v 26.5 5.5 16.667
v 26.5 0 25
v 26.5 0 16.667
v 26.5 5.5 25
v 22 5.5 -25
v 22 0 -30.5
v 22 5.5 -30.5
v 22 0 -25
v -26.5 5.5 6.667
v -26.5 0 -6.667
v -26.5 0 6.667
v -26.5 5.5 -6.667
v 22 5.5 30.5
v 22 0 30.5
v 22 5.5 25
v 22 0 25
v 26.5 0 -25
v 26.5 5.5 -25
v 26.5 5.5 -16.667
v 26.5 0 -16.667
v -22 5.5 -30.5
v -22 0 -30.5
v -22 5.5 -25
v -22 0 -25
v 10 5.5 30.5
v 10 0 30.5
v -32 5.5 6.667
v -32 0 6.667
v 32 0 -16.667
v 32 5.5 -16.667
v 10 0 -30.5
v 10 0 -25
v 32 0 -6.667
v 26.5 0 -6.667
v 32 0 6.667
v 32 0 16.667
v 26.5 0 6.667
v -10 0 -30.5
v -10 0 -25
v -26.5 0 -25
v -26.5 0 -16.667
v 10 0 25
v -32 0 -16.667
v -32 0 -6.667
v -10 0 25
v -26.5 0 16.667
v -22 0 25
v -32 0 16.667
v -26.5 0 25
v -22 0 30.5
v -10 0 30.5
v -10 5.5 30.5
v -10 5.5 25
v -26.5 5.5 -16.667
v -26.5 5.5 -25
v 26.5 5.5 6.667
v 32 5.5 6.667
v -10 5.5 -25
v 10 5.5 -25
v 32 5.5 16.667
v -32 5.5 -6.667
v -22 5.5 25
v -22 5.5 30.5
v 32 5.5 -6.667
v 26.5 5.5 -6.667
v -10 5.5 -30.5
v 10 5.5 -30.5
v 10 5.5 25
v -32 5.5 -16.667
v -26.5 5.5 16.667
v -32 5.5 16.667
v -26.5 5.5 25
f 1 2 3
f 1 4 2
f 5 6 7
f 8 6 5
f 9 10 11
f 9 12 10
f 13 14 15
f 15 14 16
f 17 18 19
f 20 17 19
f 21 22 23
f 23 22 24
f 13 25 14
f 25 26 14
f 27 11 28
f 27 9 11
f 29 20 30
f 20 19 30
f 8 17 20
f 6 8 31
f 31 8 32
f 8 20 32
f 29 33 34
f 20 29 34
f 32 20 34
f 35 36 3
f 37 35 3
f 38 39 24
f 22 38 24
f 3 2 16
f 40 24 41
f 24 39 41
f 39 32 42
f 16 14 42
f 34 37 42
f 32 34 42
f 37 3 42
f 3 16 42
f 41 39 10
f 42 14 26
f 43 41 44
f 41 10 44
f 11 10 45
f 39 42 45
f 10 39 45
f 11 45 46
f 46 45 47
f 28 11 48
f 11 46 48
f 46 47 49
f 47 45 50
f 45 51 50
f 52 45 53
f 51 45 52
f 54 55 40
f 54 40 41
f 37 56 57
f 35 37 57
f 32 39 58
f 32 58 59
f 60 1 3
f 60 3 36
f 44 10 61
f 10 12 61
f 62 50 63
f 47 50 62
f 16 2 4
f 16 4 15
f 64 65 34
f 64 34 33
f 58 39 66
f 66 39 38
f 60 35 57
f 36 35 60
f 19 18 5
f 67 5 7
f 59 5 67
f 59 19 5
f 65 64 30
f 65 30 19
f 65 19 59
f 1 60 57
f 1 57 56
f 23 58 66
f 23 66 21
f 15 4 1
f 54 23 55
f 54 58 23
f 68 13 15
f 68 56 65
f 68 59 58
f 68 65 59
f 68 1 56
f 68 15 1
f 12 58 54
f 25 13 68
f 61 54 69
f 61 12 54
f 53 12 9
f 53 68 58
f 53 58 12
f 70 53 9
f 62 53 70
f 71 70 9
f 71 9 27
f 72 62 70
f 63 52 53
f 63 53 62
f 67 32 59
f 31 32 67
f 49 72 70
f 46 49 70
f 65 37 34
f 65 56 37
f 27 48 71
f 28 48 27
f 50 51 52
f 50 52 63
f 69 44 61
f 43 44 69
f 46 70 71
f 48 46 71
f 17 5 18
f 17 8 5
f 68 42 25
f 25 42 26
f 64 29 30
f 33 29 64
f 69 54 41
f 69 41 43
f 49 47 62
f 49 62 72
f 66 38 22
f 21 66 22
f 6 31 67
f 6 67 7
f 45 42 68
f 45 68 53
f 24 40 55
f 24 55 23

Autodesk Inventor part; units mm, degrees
ref_plane "YZ Plane" through (0, 0, 0) normal (1, 0, 0) x (0, 1, 0)
ref_plane "XZ Plane" through (0, 0, 0) normal (0, 1, 0) x (-1, 0, 0)
ref_plane "XY Plane" through (0, 0, 0) normal (0, 0, 1) x (1, 0, 0)
sketch "Block1" plane through (0, 0, 0) normal (0, 0, 1) x (1, 0, 0)
  line L0 (-35.5, -12.8333) -> (-26.5, -12.8333)
  line L1 (-30, 3.8333) -> (-35.5, 3.8333)
  line L2 (-35.5, 3.8333) -> (-26.5, 3.8333)
  line L3 (-26.5, 3.8333) -> (-26.5, -12.8333)
  line L4 (-26.5, -12.8333) -> (-35.5, -12.8333)
  line L5 (-35.5, -12.8333) -> (-35.5, 3.8333)
  line L6 (26.5, 3.8333) -> (35.5, 3.8333)
  line L7 (35.5, 3.8333) -> (26.5, 3.8333)
  line L8 (26.5, 3.8333) -> (26.5, -12.8333)
  line L9 (35.5, -12.8333) -> (35.5, 3.8333)
  line L10 (26.5, -12.8333) -> (35.5, -12.8333)
  line L11 (35.5, -12.8333) -> (26.5, -12.8333)
  point P0 (0, -4.5)
  dimension "d37" = 5.5
sketch "Block2" plane through (0, 0, 0) normal (0, 0, 1) x (1, 0, 0)
  line L0 (-30, -5) -> (-35.5, -5)
  line L1 (-26.5, 5) -> (-35.5, 5)
  line L2 (-35.5, -5) -> (-26.5, -5)
  line L3 (-26.5, -5) -> (-26.5, 5)
  line L4 (-26.5, 5) -> (-35.5, 5)
  line L5 (-35.5, 5) -> (-35.5, -5)
  line L6 (26.5, -5) -> (26.5, 5)
  line L7 (35.5, -5) -> (26.5, -5)
  line L8 (26.5, 5) -> (35.5, 5)
  line L9 (35.5, 5) -> (35.5, -5)
  line L10 (26.5, 5) -> (35.5, 5)
  line L11 (26.5, -5) -> (35.5, -5)
  point P0 (0, 0)
  dimension "d51" = 5.5
sketch "Block3" plane through (0, 0, 0) normal (0, 0, 1) x (1, 0, 0)
  line L0 (-9.9, 25.1) -> (9.9, 25.1)
  line L1 (9.9, 25.1) -> (9.9, 34.1)
  line L2 (9.9, 34.1) -> (22.1, 34.1)
  line L3 (22.1, 34.1) -> (22.1, 25.1)
  line L4 (22.1, 25.1) -> (26.6, 25.1)
  line L5 (26.6, 25.1) -> (26.6, 16.7667)
  line L6 (26.6, 16.7667) -> (35.6, 16.7667)
  line L7 (35.6, 16.7667) -> (35.6, 6.5667)
  line L8 (35.6, 6.5667) -> (26.6, 6.5667)
  line L9 (26.6, 6.5667) -> (26.6, -6.5667)
  line L10 (26.6, -6.5667) -> (35.6, -6.5667)
  line L11 (35.6, -6.5667) -> (35.6, -16.7667)
  line L12 (35.6, -16.7667) -> (26.6, -16.7667)
  line L13 (26.6, -16.7667) -> (26.6, -25.1)
  line L14 (26.6, -25.1) -> (22.1, -25.1)
  line L15 (22.1, -25.1) -> (22.1, -34.1)
  line L16 (22.1, -34.1) -> (9.9, -34.1)
  line L17 (9.9, -34.1) -> (9.9, -25.1)
  line L18 (9.9, -25.1) -> (-9.9, -25.1)
  line L19 (-9.9, -25.1) -> (-9.9, -34.1)
  line L20 (-9.9, -34.1) -> (-22.1, -34.1)
  line L21 (-22.1, -34.1) -> (-22.1, -25.1)
  line L22 (-22.1, -25.1) -> (-26.6, -25.1)
  line L23 (-26.6, -25.1) -> (-26.6, -16.7667)
  line L24 (-26.6, -16.7667) -> (-35.6, -16.7667)
  line L25 (-35.6, -16.7667) -> (-35.6, -6.5667)
  line L26 (-35.6, -6.5667) -> (-26.6, -6.5667)
  line L27 (-26.6, -6.5667) -> (-26.6, 6.5667)
  line L28 (-26.6, 6.5667) -> (-35.6, 6.5667)
  line L29 (-35.6, 6.5667) -> (-35.6, 16.7667)
  line L30 (-35.6, 16.7667) -> (-26.6, 16.7667)
  line L31 (-26.6, 16.7667) -> (-26.6, 25.1)
  line L32 (-26.6, 25.1) -> (-22.1, 25.1)
  line L33 (-22.1, 25.1) -> (-22.1, 34.1)
  line L34 (-22.1, 34.1) -> (-9.9, 34.1)
  line L35 (-9.9, 34.1) -> (-9.9, 25.1)
  line L36 (-26.5, -6.6667) -> (-35.5, -6.6667)
  line L37 (-35.5, -6.6667) -> (-35.5, -16.6667)
  line L38 (-35.5, -16.6667) -> (-26.5, -16.6667)
  line L39 (-26.5, -16.6667) -> (-26.5, -25)
  line L40 (-26.5, -25) -> (-22, -25)
  line L41 (-22, -25) -> (-22, -34)
  line L42 (-22, -34) -> (-10, -34)
  line L43 (-10, -34) -> (-10, -25)
  line L44 (-10, -25) -> (10, -25)
  line L45 (10, -34) -> (10, -25)
  line L46 (22, -34) -> (10, -34)
  line L47 (22, -25) -> (22, -34)
  line L48 (22, -25) -> (26.5, -25)
  line L49 (26.5, -25) -> (26.5, -16.6667)
  line L50 (26.5, -16.6667) -> (35.5, -16.6667)
  line L51 (35.5, -16.6667) -> (35.5, -6.6667)
  line L52 (35.5, -6.6667) -> (26.5, -6.6667)
  line L53 (26.5, -6.6667) -> (26.5, 6.6667)
  line L54 (26.5, 6.6667) -> (35.5, 6.6667)
  line L55 (35.5, 6.6667) -> (35.5, 16.6667)
  line L56 (35.5, 16.6667) -> (26.5, 16.6667)
  line L57 (26.5, 16.6667) -> (26.5, 25)
  line L58 (26.5, 25) -> (22, 25)
  line L59 (22, 25) -> (22, 34)
  line L60 (22, 34) -> (10, 34)
  line L61 (10, 34) -> (10, 25)
  line L62 (10, 25) -> (-10, 25)
  line L63 (-10, 25) -> (-10, 34)
  line L64 (-10, 34) -> (-22, 34)
  line L65 (-22, 34) -> (-22, 25)
  line L66 (-22, 25) -> (-26.5, 25)
  line L67 (-26.5, 25) -> (-26.5, 16.6667)
  line L68 (-26.5, 16.6667) -> (-35.5, 16.6667)
  line L69 (-35.5, 16.6667) -> (-35.5, 6.6667)
  line L70 (-35.5, 6.6667) -> (-26.5, 6.6667)
  line L71 (-26.5, 6.6667) -> (-26.5, -6.6667)
  line L72 (-9.9, 25.1) -> (9.9, 25.1)
  line L73 (9.9, 25.1) -> (9.9, 34.1)
  line L74 (9.9, 34.1) -> (22.1, 34.1)
  line L75 (22.1, 34.1) -> (22.1, 25.1)
  line L76 (22.1, 25.1) -> (26.6, 25.1)
  line L77 (26.6, 25.1) -> (26.6, 16.7667)
  line L78 (26.6, 16.7667) -> (35.6, 16.7667)
  line L79 (35.6, 16.7667) -> (35.6, 6.5667)
  line L80 (35.6, 6.5667) -> (26.6, 6.5667)
  line L81 (26.6, 6.5667) -> (26.6, -6.5667)
  line L82 (26.6, -6.5667) -> (35.6, -6.5667)
  line L83 (35.6, -6.5667) -> (35.6, -16.7667)
  line L84 (35.6, -16.7667) -> (26.6, -16.7667)
  line L85 (26.6, -16.7667) -> (26.6, -25.1)
  line L86 (26.6, -25.1) -> (22.1, -25.1)
  line L87 (22.1, -25.1) -> (22.1, -34.1)
  line L88 (22.1, -34.1) -> (9.9, -34.1)
  line L89 (9.9, -34.1) -> (9.9, -25.1)
  line L90 (9.9, -25.1) -> (-9.9, -25.1)
  line L91 (-9.9, -25.1) -> (-9.9, -34.1)
  line L92 (-9.9, -34.1) -> (-22.1, -34.1)
  line L93 (-22.1, -34.1) -> (-22.1, -25.1)
  line L94 (-22.1, -25.1) -> (-26.6, -25.1)
  line L95 (-26.6, -25.1) -> (-26.6, -16.7667)
  line L96 (-26.6, -16.7667) -> (-35.6, -16.7667)
  line L97 (-35.6, -16.7667) -> (-35.6, -6.5667)
  line L98 (-35.6, -6.5667) -> (-26.6, -6.5667)
  line L99 (-26.6, -6.5667) -> (-26.6, 6.5667)
  line L100 (-26.6, 6.5667) -> (-35.6, 6.5667)
  line L101 (-35.6, 6.5667) -> (-35.6, 16.7667)
  line L102 (-35.6, 16.7667) -> (-26.6, 16.7667)
  line L103 (-26.6, 16.7667) -> (-26.6, 25.1)
  line L104 (-26.6, 25.1) -> (-22.1, 25.1)
  line L105 (-22.1, 25.1) -> (-22.1, 34.1)
  line L106 (-22.1, 34.1) -> (-9.9, 34.1)
  line L107 (-9.9, 34.1) -> (-9.9, 25.1)
  line L108 (-26.5, -6.6667) -> (-35.5, -6.6667)
  line L109 (-35.5, -6.6667) -> (-35.5, -16.6667)
  line L110 (-35.5, -16.6667) -> (-26.5, -16.6667)
  line L111 (-26.5, -16.6667) -> (-26.5, -25)
  line L112 (-26.5, -25) -> (-22, -25)
  line L113 (-22, -25) -> (-22, -34)
  line L114 (-22, -34) -> (-10, -34)
  line L115 (-10, -34) -> (-10, -25)
  line L116 (-10, -25) -> (10, -25)
  line L117 (10, -34) -> (10, -25)
  line L118 (22, -34) -> (10, -34)
  line L119 (22, -25) -> (22, -34)
  line L120 (22, -25) -> (26.5, -25)
  line L121 (26.5, -25) -> (26.5, -16.6667)
  line L122 (26.5, -16.6667) -> (35.5, -16.6667)
  line L123 (35.5, -16.6667) -> (35.5, -6.6667)
  line L124 (35.5, -6.6667) -> (26.5, -6.6667)
  line L125 (26.5, -6.6667) -> (26.5, 6.6667)
  line L126 (26.5, 6.6667) -> (35.5, 6.6667)
  line L127 (35.5, 6.6667) -> (35.5, 16.6667)
  line L128 (35.5, 16.6667) -> (26.5, 16.6667)
  line L129 (26.5, 16.6667) -> (26.5, 25)
  line L130 (26.5, 25) -> (22, 25)
  line L131 (22, 25) -> (22, 34)
  line L132 (22, 34) -> (10, 34)
  line L133 (10, 34) -> (10, 25)
  line L134 (10, 25) -> (-10, 25)
  line L135 (-10, 25) -> (-10, 34)
  line L136 (-10, 34) -> (-22, 34)
  line L137 (-22, 34) -> (-22, 25)
  line L138 (-22, 25) -> (-26.5, 25)
  line L139 (-26.5, 25) -> (-26.5, 16.6667)
  line L140 (-26.5, 16.6667) -> (-35.5, 16.6667)
  line L141 (-35.5, 16.6667) -> (-35.5, 6.6667)
  line L142 (-35.5, 6.6667) -> (-26.5, 6.6667)
  line L143 (-26.5, 6.6667) -> (-26.5, -6.6667)
  line L144 (-9.9, 25.1) -> (9.9, 25.1)
  line L145 (9.9, 25.1) -> (9.9, 34.1)
  line L146 (9.9, 34.1) -> (22.1, 34.1)
  line L147 (22.1, 34.1) -> (22.1, 25.1)
  line L148 (22.1, 25.1) -> (26.6, 25.1)
  line L149 (26.6, 25.1) -> (26.6, 16.7667)
  line L150 (26.6, 16.7667) -> (35.6, 16.7667)
  line L151 (35.6, 16.7667) -> (35.6, 6.5667)
  line L152 (35.6, 6.5667) -> (26.6, 6.5667)
  line L153 (26.6, 6.5667) -> (26.6, -6.5667)
  line L154 (26.6, -6.5667) -> (35.6, -6.5667)
  line L155 (35.6, -6.5667) -> (35.6, -16.7667)
  line L156 (35.6, -16.7667) -> (26.6, -16.7667)
  line L157 (26.6, -16.7667) -> (26.6, -25.1)
  line L158 (26.6, -25.1) -> (22.1, -25.1)
  line L159 (22.1, -25.1) -> (22.1, -34.1)
  line L160 (22.1, -34.1) -> (9.9, -34.1)
  line L161 (9.9, -34.1) -> (9.9, -25.1)
  line L162 (9.9, -25.1) -> (-9.9, -25.1)
  line L163 (-9.9, -25.1) -> (-9.9, -34.1)
  line L164 (-9.9, -34.1) -> (-22.1, -34.1)
  line L165 (-22.1, -34.1) -> (-22.1, -25.1)
  line L166 (-22.1, -25.1) -> (-26.6, -25.1)
  line L167 (-26.6, -25.1) -> (-26.6, -16.7667)
  line L168 (-26.6, -16.7667) -> (-35.6, -16.7667)
  line L169 (-35.6, -16.7667) -> (-35.6, -6.5667)
  line L170 (-35.6, -6.5667) -> (-26.6, -6.5667)
  line L171 (-26.6, -6.5667) -> (-26.6, 6.5667)
  line L172 (-26.6, 6.5667) -> (-35.6, 6.5667)
  line L173 (-35.6, 6.5667) -> (-35.6, 16.7667)
  line L174 (-35.6, 16.7667) -> (-26.6, 16.7667)
  line L175 (-26.6, 16.7667) -> (-26.6, 25.1)
  line L176 (-26.6, 25.1) -> (-22.1, 25.1)
  line L177 (-22.1, 25.1) -> (-22.1, 34.1)
  line L178 (-22.1, 34.1) -> (-9.9, 34.1)
  line L179 (-9.9, 34.1) -> (-9.9, 25.1)
  line L180 (-26.5, -6.6667) -> (-35.5, -6.6667)
  line L181 (-35.5, -6.6667) -> (-35.5, -16.6667)
  line L182 (-35.5, -16.6667) -> (-26.5, -16.6667)
  line L183 (-26.5, -16.6667) -> (-26.5, -25)
  line L184 (-26.5, -25) -> (-22, -25)
  line L185 (-22, -25) -> (-22, -34)
  line L186 (-22, -34) -> (-10, -34)
  line L187 (-10, -34) -> (-10, -25)
  line L188 (-10, -25) -> (10, -25)
  line L189 (10, -34) -> (10, -25)
  line L190 (22, -34) -> (10, -34)
  line L191 (22, -25) -> (22, -34)
  line L192 (22, -25) -> (26.5, -25)
  line L193 (26.5, -25) -> (26.5, -16.6667)
  line L194 (26.5, -16.6667) -> (35.5, -16.6667)
  line L195 (35.5, -16.6667) -> (35.5, -6.6667)
  line L196 (35.5, -6.6667) -> (26.5, -6.6667)
  line L197 (26.5, -6.6667) -> (26.5, 6.6667)
  line L198 (26.5, 6.6667) -> (35.5, 6.6667)
  line L199 (35.5, 6.6667) -> (35.5, 16.6667)
  line L200 (35.5, 16.6667) -> (26.5, 16.6667)
  line L201 (26.5, 16.6667) -> (26.5, 25)
  line L202 (26.5, 25) -> (22, 25)
  line L203 (22, 25) -> (22, 34)
  line L204 (22, 34) -> (10, 34)
  line L205 (10, 34) -> (10, 25)
  line L206 (10, 25) -> (-10, 25)
  line L207 (-10, 25) -> (-10, 34)
  line L208 (-10, 34) -> (-22, 34)
  line L209 (-22, 34) -> (-22, 25)
  line L210 (-22, 25) -> (-26.5, 25)
  line L211 (-26.5, 25) -> (-26.5, 16.6667)
  line L212 (-26.5, 16.6667) -> (-35.5, 16.6667)
  line L213 (-35.5, 16.6667) -> (-35.5, 6.6667)
  line L214 (-35.5, 6.6667) -> (-26.5, 6.6667)
  line L215 (-26.5, 6.6667) -> (-26.5, -6.6667)
  line L216 (-9.9, 25.1) -> (9.9, 25.1)
  line L217 (9.9, 25.1) -> (9.9, 34.1)
  line L218 (9.9, 34.1) -> (22.1, 34.1)
  line L219 (22.1, 34.1) -> (22.1, 25.1)
  line L220 (22.1, 25.1) -> (26.6, 25.1)
  line L221 (26.6, 25.1) -> (26.6, 16.7667)
  line L222 (26.6, 16.7667) -> (35.6, 16.7667)
  line L223 (35.6, 16.7667) -> (35.6, 6.5667)
  line L224 (35.6, 6.5667) -> (26.6, 6.5667)
  line L225 (26.6, 6.5667) -> (26.6, -6.5667)
  line L226 (26.6, -6.5667) -> (35.6, -6.5667)
  line L227 (35.6, -6.5667) -> (35.6, -16.7667)
  line L228 (35.6, -16.7667) -> (26.6, -16.7667)
  line L229 (26.6, -16.7667) -> (26.6, -25.1)
  line L230 (26.6, -25.1) -> (22.1, -25.1)
  line L231 (22.1, -25.1) -> (22.1, -34.1)
  line L232 (22.1, -34.1) -> (9.9, -34.1)
  line L233 (9.9, -34.1) -> (9.9, -25.1)
  line L234 (9.9, -25.1) -> (-9.9, -25.1)
  line L235 (-9.9, -25.1) -> (-9.9, -34.1)
  line L236 (-9.9, -34.1) -> (-22.1, -34.1)
  line L237 (-22.1, -34.1) -> (-22.1, -25.1)
  line L238 (-22.1, -25.1) -> (-26.6, -25.1)
  line L239 (-26.6, -25.1) -> (-26.6, -16.7667)
  line L240 (-26.6, -16.7667) -> (-35.6, -16.7667)
  line L241 (-35.6, -16.7667) -> (-35.6, -6.5667)
  line L242 (-35.6, -6.5667) -> (-26.6, -6.5667)
  line L243 (-26.6, -6.5667) -> (-26.6, 6.5667)
  line L244 (-26.6, 6.5667) -> (-35.6, 6.5667)
  line L245 (-35.6, 6.5667) -> (-35.6, 16.7667)
  line L246 (-35.6, 16.7667) -> (-26.6, 16.7667)
  line L247 (-26.6, 16.7667) -> (-26.6, 25.1)
  line L248 (-26.6, 25.1) -> (-22.1, 25.1)
  line L249 (-22.1, 25.1) -> (-22.1, 34.1)
  line L250 (-22.1, 34.1) -> (-9.9, 34.1)
  line L251 (-9.9, 34.1) -> (-9.9, 25.1)
  line L252 (-26.5, -6.6667) -> (-35.5, -6.6667)
  line L253 (-35.5, -6.6667) -> (-35.5, -16.6667)
  line L254 (-35.5, -16.6667) -> (-26.5, -16.6667)
  line L255 (-26.5, -16.6667) -> (-26.5, -25)
  line L256 (-26.5, -25) -> (-22, -25)
  line L257 (-22, -25) -> (-22, -34)
  line L258 (-22, -34) -> (-10, -34)
  line L259 (-10, -34) -> (-10, -25)
  line L260 (-10, -25) -> (10, -25)
  line L261 (10, -34) -> (10, -25)
  line L262 (22, -34) -> (10, -34)
  line L263 (22, -25) -> (22, -34)
  line L264 (22, -25) -> (26.5, -25)
  line L265 (26.5, -25) -> (26.5, -16.6667)
  line L266 (26.5, -16.6667) -> (35.5, -16.6667)
  line L267 (35.5, -16.6667) -> (35.5, -6.6667)
  line L268 (35.5, -6.6667) -> (26.5, -6.6667)
  line L269 (26.5, -6.6667) -> (26.5, 6.6667)
  line L270 (26.5, 6.6667) -> (35.5, 6.6667)
  line L271 (35.5, 6.6667) -> (35.5, 16.6667)
  line L272 (35.5, 16.6667) -> (26.5, 16.6667)
  line L273 (26.5, 16.6667) -> (26.5, 25)
  line L274 (26.5, 25) -> (22, 25)
  line L275 (22, 25) -> (22, 34)
  line L276 (22, 34) -> (10, 34)
  line L277 (10, 34) -> (10, 25)
  line L278 (10, 25) -> (-10, 25)
  line L279 (-10, 25) -> (-10, 34)
  line L280 (-10, 34) -> (-22, 34)
  line L281 (-22, 34) -> (-22, 25)
  line L282 (-22, 25) -> (-26.5, 25)
  line L283 (-26.5, 25) -> (-26.5, 16.6667)
  line L284 (-26.5, 16.6667) -> (-35.5, 16.6667)
  line L285 (-35.5, 16.6667) -> (-35.5, 6.6667)
  line L286 (-35.5, 6.6667) -> (-26.5, 6.6667)
  line L287 (-26.5, 6.6667) -> (-26.5, -6.6667)
  line L288 (-9.9, 25.1) -> (9.9, 25.1)
  line L289 (9.9, 25.1) -> (9.9, 34.1)
  line L290 (9.9, 34.1) -> (22.1, 34.1)
  line L291 (22.1, 34.1) -> (22.1, 25.1)
  line L292 (22.1, 25.1) -> (26.6, 25.1)
  line L293 (26.6, 25.1) -> (26.6, 16.7667)
  line L294 (26.6, 16.7667) -> (35.6, 16.7667)
  line L295 (35.6, 16.7667) -> (35.6, 6.5667)
  line L296 (35.6, 6.5667) -> (26.6, 6.5667)
  line L297 (26.6, 6.5667) -> (26.6, -6.5667)
  line L298 (26.6, -6.5667) -> (35.6, -6.5667)
  line L299 (35.6, -6.5667) -> (35.6, -16.7667)
  line L300 (35.6, -16.7667) -> (26.6, -16.7667)
  line L301 (26.6, -16.7667) -> (26.6, -25.1)
  line L302 (26.6, -25.1) -> (22.1, -25.1)
  line L303 (22.1, -25.1) -> (22.1, -34.1)
  line L304 (22.1, -34.1) -> (9.9, -34.1)
  line L305 (9.9, -34.1) -> (9.9, -25.1)
  line L306 (9.9, -25.1) -> (-9.9, -25.1)
  line L307 (-9.9, -25.1) -> (-9.9, -34.1)
  line L308 (-9.9, -34.1) -> (-22.1, -34.1)
  line L309 (-22.1, -34.1) -> (-22.1, -25.1)
  line L310 (-22.1, -25.1) -> (-26.6, -25.1)
  line L311 (-26.6, -25.1) -> (-26.6, -16.7667)
  line L312 (-26.6, -16.7667) -> (-35.6, -16.7667)
  line L313 (-35.6, -16.7667) -> (-35.6, -6.5667)
  line L314 (-35.6, -6.5667) -> (-26.6, -6.5667)
  line L315 (-26.6, -6.5667) -> (-26.6, 6.5667)
  line L316 (-26.6, 6.5667) -> (-35.6, 6.5667)
  line L317 (-35.6, 6.5667) -> (-35.6, 16.7667)
  line L318 (-35.6, 16.7667) -> (-26.6, 16.7667)
  line L319 (-26.6, 16.7667) -> (-26.6, 25.1)
  line L320 (-26.6, 25.1) -> (-22.1, 25.1)
  line L321 (-22.1, 25.1) -> (-22.1, 34.1)
  line L322 (-22.1, 34.1) -> (-9.9, 34.1)
  line L323 (-9.9, 34.1) -> (-9.9, 25.1)
  line L324 (-26.5, -6.6667) -> (-35.5, -6.6667)
  line L325 (-35.5, -6.6667) -> (-35.5, -16.6667)
  line L326 (-35.5, -16.6667) -> (-26.5, -16.6667)
  line L327 (-26.5, -16.6667) -> (-26.5, -25)
  line L328 (-26.5, -25) -> (-22, -25)
  line L329 (-22, -25) -> (-22, -34)
  line L330 (-22, -34) -> (-10, -34)
  line L331 (-10, -34) -> (-10, -25)
  line L332 (-10, -25) -> (10, -25)
  line L333 (10, -34) -> (10, -25)
  line L334 (22, -34) -> (10, -34)
  line L335 (22, -25) -> (22, -34)
  line L336 (22, -25) -> (26.5, -25)
  line L337 (26.5, -25) -> (26.5, -16.6667)
  line L338 (26.5, -16.6667) -> (35.5, -16.6667)
  line L339 (35.5, -16.6667) -> (35.5, -6.6667)
  line L340 (35.5, -6.6667) -> (26.5, -6.6667)
  line L341 (26.5, -6.6667) -> (26.5, 6.6667)
  line L342 (26.5, 6.6667) -> (35.5, 6.6667)
  line L343 (35.5, 6.6667) -> (35.5, 16.6667)
  line L344 (35.5, 16.6667) -> (26.5, 16.6667)
  line L345 (26.5, 16.6667) -> (26.5, 25)
  line L346 (26.5, 25) -> (22, 25)
  line L347 (22, 25) -> (22, 34)
  line L348 (22, 34) -> (10, 34)
  line L349 (10, 34) -> (10, 25)
  line L350 (10, 25) -> (-10, 25)
  line L351 (-10, 25) -> (-10, 34)
  line L352 (-10, 34) -> (-22, 34)
  line L353 (-22, 34) -> (-22, 25)
  line L354 (-22, 25) -> (-26.5, 25)
  line L355 (-26.5, 25) -> (-26.5, 16.6667)
  line L356 (-26.5, 16.6667) -> (-35.5, 16.6667)
  line L357 (-35.5, 16.6667) -> (-35.5, 6.6667)
  line L358 (-35.5, 6.6667) -> (-26.5, 6.6667)
  line L359 (-26.5, 6.6667) -> (-26.5, -6.6667)
  line L360 (-9.9, 25.1) -> (9.9, 25.1)
  line L361 (9.9, 25.1) -> (9.9, 34.1)
  line L362 (9.9, 34.1) -> (22.1, 34.1)
  line L363 (22.1, 34.1) -> (22.1, 25.1)
  line L364 (22.1, 25.1) -> (26.6, 25.1)
  line L365 (26.6, 25.1) -> (26.6, 16.7667)
  line L366 (26.6, 16.7667) -> (35.6, 16.7667)
  line L367 (35.6, 16.7667) -> (35.6, 6.5667)
  line L368 (35.6, 6.5667) -> (26.6, 6.5667)
  line L369 (26.6, 6.5667) -> (26.6, -6.5667)
  line L370 (26.6, -6.5667) -> (35.6, -6.5667)
  line L371 (35.6, -6.5667) -> (35.6, -16.7667)
  line L372 (35.6, -16.7667) -> (26.6, -16.7667)
  line L373 (26.6, -16.7667) -> (26.6, -25.1)
  line L374 (26.6, -25.1) -> (22.1, -25.1)
  line L375 (22.1, -25.1) -> (22.1, -34.1)
  line L376 (22.1, -34.1) -> (9.9, -34.1)
  line L377 (9.9, -34.1) -> (9.9, -25.1)
  line L378 (9.9, -25.1) -> (-9.9, -25.1)
  line L379 (-9.9, -25.1) -> (-9.9, -34.1)
  line L380 (-9.9, -34.1) -> (-22.1, -34.1)
  line L381 (-22.1, -34.1) -> (-22.1, -25.1)
  line L382 (-22.1, -25.1) -> (-26.6, -25.1)
  line L383 (-26.6, -25.1) -> (-26.6, -16.7667)
  line L384 (-26.6, -16.7667) -> (-35.6, -16.7667)
  line L385 (-35.6, -16.7667) -> (-35.6, -6.5667)
  line L386 (-35.6, -6.5667) -> (-26.6, -6.5667)
  line L387 (-26.6, -6.5667) -> (-26.6, 6.5667)
  line L388 (-26.6, 6.5667) -> (-35.6, 6.5667)
  line L389 (-35.6, 6.5667) -> (-35.6, 16.7667)
  line L390 (-35.6, 16.7667) -> (-26.6, 16.7667)
  line L391 (-26.6, 16.7667) -> (-26.6, 25.1)
  line L392 (-26.6, 25.1) -> (-22.1, 25.1)
  line L393 (-22.1, 25.1) -> (-22.1, 34.1)
  line L394 (-22.1, 34.1) -> (-9.9, 34.1)
  line L395 (-9.9, 34.1) -> (-9.9, 25.1)
  line L396 (-26.5, -6.6667) -> (-35.5, -6.6667)
  line L397 (-35.5, -6.6667) -> (-35.5, -16.6667)
  line L398 (-35.5, -16.6667) -> (-26.5, -16.6667)
  line L399 (-26.5, -16.6667) -> (-26.5, -25)
  line L400 (-26.5, -25) -> (-22, -25)
  line L401 (-22, -25) -> (-22, -34)
  line L402 (-22, -34) -> (-10, -34)
  line L403 (-10, -34) -> (-10, -25)
  line L404 (-10, -25) -> (10, -25)
  line L405 (10, -34) -> (10, -25)
  line L406 (22, -34) -> (10, -34)
  line L407 (22, -25) -> (22, -34)
  line L408 (22, -25) -> (26.5, -25)
  line L409 (26.5, -25) -> (26.5, -16.6667)
  line L410 (26.5, -16.6667) -> (35.5, -16.6667)
  line L411 (35.5, -16.6667) -> (35.5, -6.6667)
  line L412 (35.5, -6.6667) -> (26.5, -6.6667)
  line L413 (26.5, -6.6667) -> (26.5, 6.6667)
  line L414 (26.5, 6.6667) -> (35.5, 6.6667)
  line L415 (35.5, 6.6667) -> (35.5, 16.6667)
  line L416 (35.5, 16.6667) -> (26.5, 16.6667)
  line L417 (26.5, 16.6667) -> (26.5, 25)
  line L418 (26.5, 25) -> (22, 25)
  line L419 (22, 25) -> (22, 34)
  line L420 (22, 34) -> (10, 34)
  line L421 (10, 34) -> (10, 25)
  line L422 (10, 25) -> (-10, 25)
  line L423 (-10, 25) -> (-10, 34)
  line L424 (-10, 34) -> (-22, 34)
  line L425 (-22, 34) -> (-22, 25)
  line L426 (-22, 25) -> (-26.5, 25)
  line L427 (-26.5, 25) -> (-26.5, 16.6667)
  line L428 (-26.5, 16.6667) -> (-35.5, 16.6667)
  line L429 (-35.5, 16.6667) -> (-35.5, 6.6667)
  line L430 (-35.5, 6.6667) -> (-26.5, 6.6667)
  line L431 (-26.5, 6.6667) -> (-26.5, -6.6667)
  line L432 (-9.9, 25.1) -> (9.9, 25.1)
  line L433 (9.9, 25.1) -> (9.9, 34.1)
  line L434 (9.9, 34.1) -> (22.1, 34.1)
  line L435 (22.1, 34.1) -> (22.1, 25.1)
  line L436 (22.1, 25.1) -> (26.6, 25.1)
  line L437 (26.6, 25.1) -> (26.6, 16.7667)
  line L438 (26.6, 16.7667) -> (35.6, 16.7667)
  line L439 (35.6, 16.7667) -> (35.6, 6.5667)
  line L440 (35.6, 6.5667) -> (26.6, 6.5667)
  line L441 (26.6, 6.5667) -> (26.6, -6.5667)
  line L442 (26.6, -6.5667) -> (35.6, -6.5667)
  line L443 (35.6, -6.5667) -> (35.6, -16.7667)
  line L444 (35.6, -16.7667) -> (26.6, -16.7667)
  line L445 (26.6, -16.7667) -> (26.6, -25.1)
  line L446 (26.6, -25.1) -> (22.1, -25.1)
  line L447 (22.1, -25.1) -> (22.1, -34.1)
  line L448 (22.1, -34.1) -> (9.9, -34.1)
  line L449 (9.9, -34.1) -> (9.9, -25.1)
  line L450 (9.9, -25.1) -> (-9.9, -25.1)
  line L451 (-9.9, -25.1) -> (-9.9, -34.1)
  line L452 (-9.9, -34.1) -> (-22.1, -34.1)
  line L453 (-22.1, -34.1) -> (-22.1, -25.1)
  line L454 (-22.1, -25.1) -> (-26.6, -25.1)
  line L455 (-26.6, -25.1) -> (-26.6, -16.7667)
  line L456 (-26.6, -16.7667) -> (-35.6, -16.7667)
  line L457 (-35.6, -16.7667) -> (-35.6, -6.5667)
  line L458 (-35.6, -6.5667) -> (-26.6, -6.5667)
  line L459 (-26.6, -6.5667) -> (-26.6, 6.5667)
  line L460 (-26.6, 6.5667) -> (-35.6, 6.5667)
  line L461 (-35.6, 6.5667) -> (-35.6, 16.7667)
  line L462 (-35.6, 16.7667) -> (-26.6, 16.7667)
  line L463 (-26.6, 16.7667) -> (-26.6, 25.1)
  line L464 (-26.6, 25.1) -> (-22.1, 25.1)
  line L465 (-22.1, 25.1) -> (-22.1, 34.1)
  line L466 (-22.1, 34.1) -> (-9.9, 34.1)
  line L467 (-9.9, 34.1) -> (-9.9, 25.1)
  line L468 (-26.5, -6.6667) -> (-35.5, -6.6667)
  line L469 (-35.5, -6.6667) -> (-35.5, -16.6667)
  line L470 (-35.5, -16.6667) -> (-26.5, -16.6667)
  line L471 (-26.5, -16.6667) -> (-26.5, -25)
  line L472 (-26.5, -25) -> (-22, -25)
  line L473 (-22, -25) -> (-22, -34)
  line L474 (-22, -34) -> (-10, -34)
  line L475 (-10, -34) -> (-10, -25)
  line L476 (-10, -25) -> (10, -25)
  line L477 (10, -34) -> (10, -25)
  line L478 (22, -34) -> (10, -34)
  line L479 (22, -25) -> (22, -34)
  line L480 (22, -25) -> (26.5, -25)
  line L481 (26.5, -25) -> (26.5, -16.6667)
  line L482 (26.5, -16.6667) -> (35.5, -16.6667)
  line L483 (35.5, -16.6667) -> (35.5, -6.6667)
  line L484 (35.5, -6.6667) -> (26.5, -6.6667)
  line L485 (26.5, -6.6667) -> (26.5, 6.6667)
  line L486 (26.5, 6.6667) -> (35.5, 6.6667)
  line L487 (35.5, 6.6667) -> (35.5, 16.6667)
  line L488 (35.5, 16.6667) -> (26.5, 16.6667)
  line L489 (26.5, 16.6667) -> (26.5, 25)
  line L490 (26.5, 25) -> (22, 25)
  line L491 (22, 25) -> (22, 34)
  line L492 (22, 34) -> (10, 34)
  line L493 (10, 34) -> (10, 25)
  line L494 (10, 25) -> (-10, 25)
  line L495 (-10, 25) -> (-10, 34)
  line L496 (-10, 34) -> (-22, 34)
  line L497 (-22, 34) -> (-22, 25)
  line L498 (-22, 25) -> (-26.5, 25)
  line L499 (-26.5, 25) -> (-26.5, 16.6667)
  line L500 (-26.5, 16.6667) -> (-35.5, 16.6667)
  line L501 (-35.5, 16.6667) -> (-35.5, 6.6667)
  line L502 (-35.5, 6.6667) -> (-26.5, 6.6667)
  line L503 (-26.5, 6.6667) -> (-26.5, -6.6667)
  line L504 (-9.9, 25.1) -> (9.9, 25.1)
  line L505 (9.9, 25.1) -> (9.9, 34.1)
  line L506 (9.9, 34.1) -> (22.1, 34.1)
  line L507 (22.1, 34.1) -> (22.1, 25.1)
  line L508 (22.1, 25.1) -> (26.6, 25.1)
  line L509 (26.6, 25.1) -> (26.6, 16.7667)
  line L510 (26.6, 16.7667) -> (35.6, 16.7667)
  line L511 (35.6, 16.7667) -> (35.6, 6.5667)
  line L512 (35.6, 6.5667) -> (26.6, 6.5667)
  line L513 (26.6, 6.5667) -> (26.6, -6.5667)
  line L514 (26.6, -6.5667) -> (35.6, -6.5667)
  line L515 (35.6, -6.5667) -> (35.6, -16.7667)
  line L516 (35.6, -16.7667) -> (26.6, -16.7667)
  line L517 (26.6, -16.7667) -> (26.6, -25.1)
  line L518 (26.6, -25.1) -> (22.1, -25.1)
  line L519 (22.1, -25.1) -> (22.1, -34.1)
  line L520 (22.1, -34.1) -> (9.9, -34.1)
  line L521 (9.9, -34.1) -> (9.9, -25.1)
  line L522 (9.9, -25.1) -> (-9.9, -25.1)
  line L523 (-9.9, -25.1) -> (-9.9, -34.1)
  line L524 (-9.9, -34.1) -> (-22.1, -34.1)
  line L525 (-22.1, -34.1) -> (-22.1, -25.1)
  line L526 (-22.1, -25.1) -> (-26.6, -25.1)
  line L527 (-26.6, -25.1) -> (-26.6, -16.7667)
  line L528 (-26.6, -16.7667) -> (-35.6, -16.7667)
  line L529 (-35.6, -16.7667) -> (-35.6, -6.5667)
  line L530 (-35.6, -6.5667) -> (-26.6, -6.5667)
  line L531 (-26.6, -6.5667) -> (-26.6, 6.5667)
  line L532 (-26.6, 6.5667) -> (-35.6, 6.5667)
  line L533 (-35.6, 6.5667) -> (-35.6, 16.7667)
  line L534 (-35.6, 16.7667) -> (-26.6, 16.7667)
  line L535 (-26.6, 16.7667) -> (-26.6, 25.1)
  line L536 (-26.6, 25.1) -> (-22.1, 25.1)
  line L537 (-22.1, 25.1) -> (-22.1, 34.1)
  line L538 (-22.1, 34.1) -> (-9.9, 34.1)
  line L539 (-9.9, 34.1) -> (-9.9, 25.1)
  point P0 (0, 0)
  point P1 (0, 0)
  point P2 (0, 0)
  point P3 (0, 0)
  point P4 (0, 0)
  point P5 (0, 0)
  point P6 (0, 0)
  point P7 (0, 0)
  dimension "d58" = 0.1
  dimension "d60" = 0.1
  dimension "d61" = 0.1
  dimension "d64" = 0.1
  dimension "d65" = 0.1
  dimension "d66" = 0.1
  dimension "d67" = 0.1
sketch "Block4" plane through (0, 0, 0) normal (0, 0, 1) x (1, 0, 0)
  line L0 (-8, 27) -> (8, 27)
  line L1 (8, 27) -> (8, 36)
  line L2 (8, 36) -> (24, 36)
  line L3 (24, 36) -> (24, 27)
  line L4 (24, 27) -> (28.5, 27)
  line L5 (28.5, 27) -> (28.5, 18.6667)
  line L6 (28.5, 18.6667) -> (37.5, 18.6667)
  line L7 (37.5, 18.6667) -> (37.5, 4.6667)
  line L8 (37.5, 4.6667) -> (28.5, 4.6667)
  line L9 (28.5, 4.6667) -> (28.5, -4.6667)
  line L10 (28.5, -4.6667) -> (37.5, -4.6667)
  line L11 (37.5, -4.6667) -> (37.5, -18.6667)
  line L12 (37.5, -18.6667) -> (28.5, -18.6667)
  line L13 (28.5, -18.6667) -> (28.5, -27)
  line L14 (28.5, -27) -> (24, -27)
  line L15 (24, -27) -> (24, -36)
  line L16 (24, -36) -> (8, -36)
  line L17 (8, -36) -> (8, -27)
  line L18 (8, -27) -> (-8, -27)
  line L19 (-8, -27) -> (-8, -36)
  line L20 (-8, -36) -> (-24, -36)
  line L21 (-24, -36) -> (-24, -27)
  line L22 (-24, -27) -> (-28.5, -27)
  line L23 (-28.5, -27) -> (-28.5, -18.6667)
  line L24 (-28.5, -18.6667) -> (-37.5, -18.6667)
  line L25 (-37.5, -18.6667) -> (-37.5, -4.6667)
  line L26 (-37.5, -4.6667) -> (-28.5, -4.6667)
  line L27 (-28.5, -4.6667) -> (-28.5, 4.6667)
  line L28 (-28.5, 4.6667) -> (-37.5, 4.6667)
  line L29 (-37.5, 4.6667) -> (-37.5, 18.6667)
  line L30 (-37.5, 18.6667) -> (-28.5, 18.6667)
  line L31 (-28.5, 18.6667) -> (-28.5, 27)
  line L32 (-28.5, 27) -> (-24, 27)
  line L33 (-24, 27) -> (-24, 36)
  line L34 (-24, 36) -> (-8, 36)
  line L35 (-8, 36) -> (-8, 27)
  point P0 (0, 0)
sketch "Block5" plane through (0, 0, 0) normal (0, 0, 1) x (1, 0, 0)
  line L0 (-9.9, 25.1) -> (9.9, 25.1)
  line L1 (9.9, 25.1) -> (9.9, 34.1)
  line L2 (9.9, 34.1) -> (22.1, 34.1)
  line L3 (22.1, 34.1) -> (22.1, 25.1)
  line L4 (22.1, 25.1) -> (26.6, 25.1)
  line L5 (26.6, 25.1) -> (26.6, 16.7667)
  line L6 (26.6, 16.7667) -> (35.6, 16.7667)
  line L7 (35.6, 16.7667) -> (35.6, 6.5667)
  line L8 (35.6, 6.5667) -> (26.6, 6.5667)
  line L9 (26.6, 6.5667) -> (26.6, -6.5667)
  line L10 (26.6, -6.5667) -> (35.6, -6.5667)
  line L11 (35.6, -6.5667) -> (35.6, -16.7667)
  line L12 (35.6, -16.7667) -> (26.6, -16.7667)
  line L13 (26.6, -16.7667) -> (26.6, -25.1)
  line L14 (26.6, -25.1) -> (22.1, -25.1)
  line L15 (22.1, -25.1) -> (22.1, -34.1)
  line L16 (22.1, -34.1) -> (9.9, -34.1)
  line L17 (9.9, -34.1) -> (9.9, -25.1)
  line L18 (9.9, -25.1) -> (-9.9, -25.1)
  line L19 (-9.9, -25.1) -> (-9.9, -34.1)
  line L20 (-9.9, -34.1) -> (-22.1, -34.1)
  line L21 (-22.1, -34.1) -> (-22.1, -25.1)
  line L22 (-22.1, -25.1) -> (-26.6, -25.1)
  line L23 (-26.6, -25.1) -> (-26.6, -16.7667)
  line L24 (-26.6, -16.7667) -> (-35.6, -16.7667)
  line L25 (-35.6, -16.7667) -> (-35.6, -6.5667)
  line L26 (-35.6, -6.5667) -> (-26.6, -6.5667)
  line L27 (-26.6, -6.5667) -> (-26.6, 6.5667)
  line L28 (-26.6, 6.5667) -> (-35.6, 6.5667)
  line L29 (-35.6, 6.5667) -> (-35.6, 16.7667)
  line L30 (-35.6, 16.7667) -> (-26.6, 16.7667)
  line L31 (-26.6, 16.7667) -> (-26.6, 25.1)
  line L32 (-26.6, 25.1) -> (-22.1, 25.1)
  line L33 (-22.1, 25.1) -> (-22.1, 34.1)
  line L34 (-22.1, 34.1) -> (-9.9, 34.1)
  line L35 (-9.9, 34.1) -> (-9.9, 25.1)
  point P0 (0, 0)
sketch "Block6" plane through (0, 0, 0) normal (0, 0, 1) x (1, 0, 0)
  line L0 (9.8, 34.2) -> (22.2, 34.2)
  line L1 (22.2, 34.2) -> (22.2, 25.2)
  line L2 (22.2, 25.2) -> (26.7, 25.2)
  line L3 (26.7, 25.2) -> (26.7, 16.8667)
  line L4 (26.7, 16.8667) -> (35.7, 16.8667)
  line L5 (35.7, 16.8667) -> (35.7, 6.4667)
  line L6 (35.7, 6.4667) -> (26.7, 6.4667)
  line L7 (26.7, 6.4667) -> (26.7, -6.4667)
  line L8 (26.7, -6.4667) -> (35.7, -6.4667)
  line L9 (35.7, -6.4667) -> (35.7, -16.8667)
  line L10 (35.7, -16.8667) -> (26.7, -16.8667)
  line L11 (26.7, -16.8667) -> (26.7, -25.2)
  line L12 (26.7, -25.2) -> (22.2, -25.2)
  line L13 (22.2, -25.2) -> (22.2, -34.2)
  line L14 (22.2, -34.2) -> (9.8, -34.2)
  line L15 (9.8, -34.2) -> (9.8, -25.2)
  line L16 (9.8, -25.2) -> (-9.8, -25.2)
  line L17 (-9.8, -25.2) -> (-9.8, -34.2)
  line L18 (-9.8, -34.2) -> (-22.2, -34.2)
  line L19 (-22.2, -34.2) -> (-22.2, -25.2)
  line L20 (-22.2, -25.2) -> (-26.7, -25.2)
  line L21 (-26.7, -25.2) -> (-26.7, -16.8667)
  line L22 (-26.7, -16.8667) -> (-35.7, -16.8667)
  line L23 (-35.7, -16.8667) -> (-35.7, -6.4667)
  line L24 (-35.7, -6.4667) -> (-26.7, -6.4667)
  line L25 (-26.7, -6.4667) -> (-26.7, 6.4667)
  line L26 (-26.7, 6.4667) -> (-35.7, 6.4667)
  line L27 (-35.7, 6.4667) -> (-35.7, 16.8667)
  line L28 (-35.7, 16.8667) -> (-26.7, 16.8667)
  line L29 (-26.7, 16.8667) -> (-26.7, 25.2)
  line L30 (-26.7, 25.2) -> (-22.2, 25.2)
  line L31 (-22.2, 25.2) -> (-22.2, 34.2)
  line L32 (-22.2, 34.2) -> (-9.8, 34.2)
  line L33 (-9.8, 34.2) -> (-9.8, 25.2)
  line L34 (-9.8, 25.2) -> (9.8, 25.2)
  line L35 (9.8, 25.2) -> (9.8, 34.2)
  point P0 (0, 0)
sketch "Block7" plane through (0, 0, 0) normal (0, 0, 1) x (1, 0, 0)
  line L0 (9.9, 34.1) -> (22.1, 34.1)
  line L1 (22.1, 34.1) -> (22.1, 25.1)
  line L2 (22.1, 25.1) -> (26.6, 25.1)
  line L3 (26.6, 25.1) -> (26.6, 16.7667)
  line L4 (26.6, 16.7667) -> (35.6, 16.7667)
  line L5 (35.6, 16.7667) -> (35.6, 6.5667)
  line L6 (35.6, 6.5667) -> (26.6, 6.5667)
  line L7 (26.6, 6.5667) -> (26.6, -6.5667)
  line L8 (26.6, -6.5667) -> (35.6, -6.5667)
  line L9 (35.6, -6.5667) -> (35.6, -16.7667)
  line L10 (35.6, -16.7667) -> (26.6, -16.7667)
  line L11 (26.6, -16.7667) -> (26.6, -25.1)
  line L12 (26.6, -25.1) -> (22.1, -25.1)
  line L13 (22.1, -25.1) -> (22.1, -34.1)
  line L14 (22.1, -34.1) -> (9.9, -34.1)
  line L15 (9.9, -34.1) -> (9.9, -25.1)
  line L16 (9.9, -25.1) -> (-9.9, -25.1)
  line L17 (-9.9, -25.1) -> (-9.9, -34.1)
  line L18 (-9.9, -34.1) -> (-22.1, -34.1)
  line L19 (-22.1, -34.1) -> (-22.1, -25.1)
  line L20 (-22.1, -25.1) -> (-26.6, -25.1)
  line L21 (-26.6, -25.1) -> (-26.6, -16.7667)
  line L22 (-26.6, -16.7667) -> (-35.6, -16.7667)
  line L23 (-35.6, -16.7667) -> (-35.6, -6.5667)
  line L24 (-35.6, -6.5667) -> (-26.6, -6.5667)
  line L25 (-26.6, -6.5667) -> (-26.6, 6.5667)
  line L26 (-26.6, 6.5667) -> (-35.6, 6.5667)
  line L27 (-35.6, 6.5667) -> (-35.6, 16.7667)
  line L28 (-35.6, 16.7667) -> (-26.6, 16.7667)
  line L29 (-26.6, 16.7667) -> (-26.6, 25.1)
  line L30 (-26.6, 25.1) -> (-22.1, 25.1)
  line L31 (-22.1, 25.1) -> (-22.1, 34.1)
  line L32 (-22.1, 34.1) -> (-9.9, 34.1)
  line L33 (-9.9, 34.1) -> (-9.9, 25.1)
  line L34 (-9.9, 25.1) -> (9.9, 25.1)
  line L35 (9.9, 25.1) -> (9.9, 34.1)
  point P0 (0, 0)
sketch "Block8" plane through (0, 0, 0) normal (0, 0, 1) x (1, 0, 0)
  line L0 (-9.92, 25.08) -> (9.92, 25.08)
  line L1 (9.92, 25.08) -> (9.92, 30.58)
  line L2 (9.92, 30.58) -> (22.08, 30.58)
  line L3 (22.08, 30.58) -> (22.08, 25.08)
  line L4 (22.08, 25.08) -> (26.58, 25.08)
  line L5 (26.58, 25.08) -> (26.58, 16.7467)
  line L6 (26.58, 16.7467) -> (32.08, 16.7467)
  line L7 (32.08, 16.7467) -> (32.08, 6.5867)
  line L8 (32.08, 6.5867) -> (26.58, 6.5867)
  line L9 (26.58, 6.5867) -> (26.58, -6.5867)
  line L10 (26.58, -6.5867) -> (32.08, -6.5867)
  line L11 (32.08, -6.5867) -> (32.08, -16.7467)
  line L12 (32.08, -16.7467) -> (26.58, -16.7467)
  line L13 (26.58, -16.7467) -> (26.58, -25.08)
  line L14 (26.58, -25.08) -> (22.08, -25.08)
  line L15 (22.08, -25.08) -> (22.08, -30.58)
  line L16 (22.08, -30.58) -> (9.92, -30.58)
  line L17 (9.92, -30.58) -> (9.92, -25.08)
  line L18 (9.92, -25.08) -> (-9.92, -25.08)
  line L19 (-9.92, -25.08) -> (-9.92, -30.58)
  line L20 (-9.92, -30.58) -> (-22.08, -30.58)
  line L21 (-22.08, -30.58) -> (-22.08, -25.08)
  line L22 (-22.08, -25.08) -> (-26.58, -25.08)
  line L23 (-26.58, -25.08) -> (-26.58, -16.7467)
  line L24 (-26.58, -16.7467) -> (-32.08, -16.7467)
  line L25 (-32.08, -16.7467) -> (-32.08, -6.5867)
  line L26 (-32.08, -6.5867) -> (-26.58, -6.5867)
  line L27 (-26.58, -6.5867) -> (-26.58, 6.5867)
  line L28 (-26.58, 6.5867) -> (-32.08, 6.5867)
  line L29 (-32.08, 6.5867) -> (-32.08, 16.7467)
  line L30 (-32.08, 16.7467) -> (-26.58, 16.7467)
  line L31 (-26.58, 16.7467) -> (-26.58, 25.08)
  line L32 (-26.58, 25.08) -> (-22.08, 25.08)
  line L33 (-22.08, 25.08) -> (-22.08, 30.58)
  line L34 (-22.08, 30.58) -> (-9.92, 30.58)
  line L35 (-9.92, 30.58) -> (-9.92, 25.08)
  point P0 (0, 0)
sketch "Sketch2" plane through (0, 0, 0) normal (0, 1, 0) x (-1, 0, 0)
  line L0 (32, -25) -> (-32, -25)
  line L1 (-32, -25) -> (-32, 25)
  line L2 (-32, 25) -> (32, 25)
  line L3 (32, 25) -> (32, -25)
  line L4 (32, -25) -> (-32, 25) construction
  line L5 (-32, -25) -> (32, 25) construction
  point P0 (0, 0)
  dimension "d0" = 64
  dimension "d1" = 50
extrude "Extrusion1" add sketch "Sketch2" along normal blind 5.5
sketch "Sketch4" plane through (0, 0, 0) normal (0, -1, 0) x (1, 0, 0)
  line L0 (-32, -25) -> (32, -25) projected
  line L1 (-22, -25) -> (-10, -25)
  line L2 (-10, -25) -> (-10, -30.5)
  line L3 (-10, -30.5) -> (-22, -30.5)
  line L4 (-22, -30.5) -> (-22, -25)
  line L5 (0, -47.9488) -> (0, 48.9927) projected
  line L6 (-1026.854, 0) -> (1026.854, 0) projected
  line L7 (22, -25) -> (10, -25)
  line L8 (10, -25) -> (10, -30.5)
  line L9 (10, -30.5) -> (22, -30.5)
  line L10 (22, -30.5) -> (22, -25)
  line L11 (-22, 25) -> (-10, 25)
  line L12 (-10, 25) -> (-10, 30.5)
  line L13 (-10, 30.5) -> (-22, 30.5)
  line L14 (-22, 30.5) -> (-22, 25)
  line L15 (10, 25) -> (10, 30.5)
  line L16 (10, 30.5) -> (22, 30.5)
  line L17 (22, 30.5) -> (22, 25)
  line L18 (22, 25) -> (10, 25)
  point P0 (0, 0)
  dimension "d9" = 5.5
  dimension "d10" = 20
  dimension "d11" = 12
extrude "Extrusion3" add sketch "Sketch4" against normal blind 5.5
sketch "Sketch7" plane through (0, 5.5, 0) normal (0, 1, 0) x (1, 0, 0)
  line L0 (0, 47.9488) -> (0, -48.9927) projected
  line L1 (-32, -25) -> (-26.5, -25)
  line L2 (-26.5, -25) -> (-26.5, -16.6667)
  line L3 (-26.5, -16.6667) -> (-32, -16.6667)
  line L4 (-32, -16.6667) -> (-32, -25)
  line L5 (-1026.854, 0) -> (1026.854, 0) projected
  line L6 (-32, 25) -> (-26.5, 25)
  line L7 (-26.5, 25) -> (-26.5, 16.6667)
  line L8 (-26.5, 16.6667) -> (-32, 16.6667)
  line L9 (-32, 16.6667) -> (-32, 25)
  line L10 (32, -25) -> (26.5, -25)
  line L11 (26.5, -25) -> (26.5, -16.6667)
  line L12 (26.5, -16.6667) -> (32, -16.6667)
  line L13 (32, -16.6667) -> (32, -25)
  line L14 (26.5, 25) -> (26.5, 16.6667)
  line L15 (32, 25) -> (26.5, 25)
  line L16 (26.5, 16.6667) -> (32, 16.6667)
  line L17 (32, 16.6667) -> (32, 25)
  point P0 (0, 0)
  dimension "d47" = 5.5
  dimension "d48" = 8.3333
extrude "Extrusion10" cut sketch "Sketch7" against normal through all
sketch "Sketch8" plane through (0, 5.5, 0) normal (0, 1, 0) x (1, 0, 0)
  line L0 (-32, -16.6667) -> (-23, -16.6667)
  line L1 (-1026.854, 0) -> (1026.854, 0) projected
  line L2 (0, 47.9488) -> (0, -48.9927) projected
  line L3 (-32, 16.6667) -> (-26.5, 16.6667)
  line L4 (-32, 16.6667) -> (-23, 16.6667)
  line L5 (-32, -16.6667) -> (-26.5, -16.6667)
  line L6 (-26.5, -16.6667) -> (-26.5, -6.6667)
  line L7 (-26.5, -6.6667) -> (-32, -6.6667)
  line L8 (-32, -6.6667) -> (-32, -16.6667)
  line L9 (-32, 16.6667) -> (-23, 16.6667)
  line L10 (-32, 16.6667) -> (-26.5, 16.6667)
  line L11 (-26.5, 16.6667) -> (-26.5, 6.6667)
  line L12 (-26.5, 6.6667) -> (-32, 6.6667)
  line L13 (-32, 6.6667) -> (-32, 16.6667)
  line L14 (32, -16.6667) -> (23, -16.6667)
  line L15 (32, 16.6667) -> (23, 16.6667)
  line L16 (32, 16.6667) -> (23, 16.6667)
  line L17 (32, 16.6667) -> (26.5, 16.6667)
  line L18 (-32, -6.6667) -> (-26.5, -6.6667)
  line L19 (-26.5, 6.6667) -> (-32, 6.6667)
  line L20 (32, -16.6667) -> (23, -16.6667)
  line L21 (32, 16.6667) -> (26.5, 16.6667)
  line L22 (32, 16.6667) -> (23, 16.6667)
  line L23 (32, -16.6667) -> (26.5, -16.6667)
  line L24 (26.5, -16.6667) -> (26.5, -6.6667)
  line L25 (26.5, -6.6667) -> (32, -6.6667)
  line L26 (32, -6.6667) -> (32, -16.6667)
  line L27 (26.5, 16.6667) -> (26.5, 6.6667)
  line L28 (32, 16.6667) -> (23, 16.6667)
  line L29 (32, 16.6667) -> (26.5, 16.6667)
  line L30 (32, 6.6667) -> (32, 16.6667)
  line L31 (26.5, 6.6667) -> (32, 6.6667)
  line L32 (32, -6.6667) -> (26.5, -6.6667)
  line L33 (26.5, 6.6667) -> (32, 6.6667)
  line L34 (-26.5, -6.6667) -> (-32, -6.6667)
  line L35 (-32, -6.6667) -> (-32, 6.6667)
  line L36 (-32, 6.6667) -> (-26.5, 6.6667)
  line L37 (-26.5, 6.6667) -> (-26.5, -6.6667)
  line L38 (32, -6.6667) -> (26.5, -6.6667)
  line L39 (26.5, -6.6667) -> (26.5, 6.6667)
  line L40 (26.5, 6.6667) -> (32, 6.6667)
  line L41 (32, 6.6667) -> (32, -6.6667)
  point P0 (-26.5, -16.6667)
  point P1 (0, 0)
  point P2 (26.5, -16.6667)
  point P3 (26.5, -16.6667)
  dimension "d53" = 5.5
  dimension "d54" = 10
  dimension "d76" = 0.08
extrude "Extrusion11" cut sketch "Sketch8" against normal through all contours L39 L31 L41 L1 | L1 L41 L25 L39 | L35 L1 L37 L7 | L35 L12 L37 L1
equation "\"d37\" = Wt"
equation "\"d51\" = Wt"
equation "\"d58\" = d59"
equation "\"d60\" = d62"
equation "\"d61\" = d63"
equation "\"d64\" = d68"
equation "\"d65\" = d69"
equation "\"d66\" = d70"
equation "\"d67\" = d71"
equation "\"d2\" = Wt"
equation "\"d9\" = Wt"
equation "\"d12\" = Wt"
equation "\"d47\" = Wt"
equation "\"d48\" = 0.166667 * d1"
equation "\"d49\" = Wt"
equation "\"d53\" = Wt"
equation "\"d54\" = 0.2 * d1"
equation "\"d55\" = Wt"
equation "\"d76\" = Kerf"
equation "\"Wt\" = 5.5"
equation "\"d59\" = 0.1"
equation "\"d62\" = 0.1"
equation "\"d63\" = 0.1"
equation "\"d68\" = 0.1"
equation "\"d69\" = 0.1"
equation "\"d70\" = 0.1"
equation "\"d71\" = 0.1"
equation "\"Kerf\" = 0.08"
properties part number "holder_plate_side" material "Wood (Birch)"
